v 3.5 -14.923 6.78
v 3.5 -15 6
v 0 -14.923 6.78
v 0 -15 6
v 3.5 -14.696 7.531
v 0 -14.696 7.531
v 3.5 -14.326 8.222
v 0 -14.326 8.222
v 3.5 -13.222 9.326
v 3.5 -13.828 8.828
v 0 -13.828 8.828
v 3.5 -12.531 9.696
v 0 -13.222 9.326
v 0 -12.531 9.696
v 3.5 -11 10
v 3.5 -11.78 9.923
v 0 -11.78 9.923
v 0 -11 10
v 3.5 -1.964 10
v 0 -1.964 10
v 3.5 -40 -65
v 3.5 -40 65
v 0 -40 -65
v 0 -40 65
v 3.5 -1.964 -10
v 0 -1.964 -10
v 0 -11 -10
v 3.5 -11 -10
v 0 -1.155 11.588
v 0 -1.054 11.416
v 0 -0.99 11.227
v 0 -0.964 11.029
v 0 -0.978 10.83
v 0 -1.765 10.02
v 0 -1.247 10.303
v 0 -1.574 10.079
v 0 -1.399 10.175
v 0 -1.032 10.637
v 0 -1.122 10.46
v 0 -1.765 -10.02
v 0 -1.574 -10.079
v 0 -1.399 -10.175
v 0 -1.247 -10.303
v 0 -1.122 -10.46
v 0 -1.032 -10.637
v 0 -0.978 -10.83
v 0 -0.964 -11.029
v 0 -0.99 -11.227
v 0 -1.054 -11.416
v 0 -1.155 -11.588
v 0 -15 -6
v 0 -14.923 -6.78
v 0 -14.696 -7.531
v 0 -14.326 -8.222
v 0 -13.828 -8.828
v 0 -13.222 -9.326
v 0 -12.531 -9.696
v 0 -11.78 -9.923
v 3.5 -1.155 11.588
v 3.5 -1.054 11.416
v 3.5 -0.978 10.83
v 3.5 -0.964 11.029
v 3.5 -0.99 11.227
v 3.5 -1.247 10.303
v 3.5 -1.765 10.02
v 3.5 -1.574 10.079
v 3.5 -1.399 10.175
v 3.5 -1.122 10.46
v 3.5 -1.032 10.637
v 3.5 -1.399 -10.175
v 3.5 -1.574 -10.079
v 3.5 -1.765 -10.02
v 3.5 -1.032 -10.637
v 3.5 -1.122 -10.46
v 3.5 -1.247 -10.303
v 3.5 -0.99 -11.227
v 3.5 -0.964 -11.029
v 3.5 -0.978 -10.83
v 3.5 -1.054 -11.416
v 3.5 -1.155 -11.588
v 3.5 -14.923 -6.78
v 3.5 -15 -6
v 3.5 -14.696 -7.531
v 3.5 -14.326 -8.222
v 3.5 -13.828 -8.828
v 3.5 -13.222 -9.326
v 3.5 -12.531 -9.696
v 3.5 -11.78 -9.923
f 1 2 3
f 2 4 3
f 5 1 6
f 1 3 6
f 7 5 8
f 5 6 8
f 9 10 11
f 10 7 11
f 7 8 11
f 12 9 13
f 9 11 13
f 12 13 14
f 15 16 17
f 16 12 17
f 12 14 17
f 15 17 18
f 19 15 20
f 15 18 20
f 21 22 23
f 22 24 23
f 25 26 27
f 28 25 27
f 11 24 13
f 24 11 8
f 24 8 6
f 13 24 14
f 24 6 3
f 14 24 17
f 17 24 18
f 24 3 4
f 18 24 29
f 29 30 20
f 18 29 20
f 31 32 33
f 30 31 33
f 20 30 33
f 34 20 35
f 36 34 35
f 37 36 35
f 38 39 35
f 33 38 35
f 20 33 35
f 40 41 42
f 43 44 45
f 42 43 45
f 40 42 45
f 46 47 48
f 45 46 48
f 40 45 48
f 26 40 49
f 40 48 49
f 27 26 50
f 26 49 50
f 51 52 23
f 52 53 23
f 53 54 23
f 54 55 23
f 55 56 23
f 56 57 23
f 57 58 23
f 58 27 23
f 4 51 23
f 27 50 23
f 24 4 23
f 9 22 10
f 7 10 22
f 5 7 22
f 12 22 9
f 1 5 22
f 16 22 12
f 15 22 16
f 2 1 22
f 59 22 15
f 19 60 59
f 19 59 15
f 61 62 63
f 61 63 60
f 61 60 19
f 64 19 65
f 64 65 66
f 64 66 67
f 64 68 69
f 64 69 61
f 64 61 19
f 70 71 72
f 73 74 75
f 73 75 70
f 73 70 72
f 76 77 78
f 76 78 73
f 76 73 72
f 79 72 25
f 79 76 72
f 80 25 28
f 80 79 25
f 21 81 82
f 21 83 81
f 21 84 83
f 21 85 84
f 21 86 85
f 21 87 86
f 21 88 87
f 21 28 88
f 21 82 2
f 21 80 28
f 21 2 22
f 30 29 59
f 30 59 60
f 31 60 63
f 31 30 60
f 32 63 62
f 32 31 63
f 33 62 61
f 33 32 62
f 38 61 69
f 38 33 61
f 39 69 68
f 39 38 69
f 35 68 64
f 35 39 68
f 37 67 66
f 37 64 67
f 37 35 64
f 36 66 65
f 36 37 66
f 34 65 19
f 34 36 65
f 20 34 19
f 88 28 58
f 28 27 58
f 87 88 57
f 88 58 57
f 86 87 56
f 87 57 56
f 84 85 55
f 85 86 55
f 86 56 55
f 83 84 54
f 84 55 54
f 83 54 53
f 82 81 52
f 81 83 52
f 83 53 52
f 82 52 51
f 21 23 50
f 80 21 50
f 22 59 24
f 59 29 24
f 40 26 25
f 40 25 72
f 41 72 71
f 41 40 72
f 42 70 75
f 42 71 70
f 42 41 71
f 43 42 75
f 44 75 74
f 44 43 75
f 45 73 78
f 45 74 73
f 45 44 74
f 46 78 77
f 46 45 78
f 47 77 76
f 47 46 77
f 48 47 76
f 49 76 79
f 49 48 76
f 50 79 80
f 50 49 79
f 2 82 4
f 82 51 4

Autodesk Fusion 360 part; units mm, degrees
sketch "Sketch1" plane through (0, 0, 0) normal (1, 0, 0) x (0, 0, -1)
  line L0 (10, -1.9638) -> (10, -11)
  line L1 (6, -15) -> (-6, -15)
  line L2 (-10, -11) -> (-10, -1.9638)
  line L3 (-65, -40) -> (65, -40)
  line L4 (-11.5882, -1.155) -> (-65, -40)
  line L5 (65, -40) -> (11.5882, -1.155)
  arc A0 (-10, -11) -> (-6, -15) centre (-6, -11) ccw
  arc A1 (6, -15) -> (10, -11) centre (6, -11) ccw
  arc A2 (-10, -1.9638) -> (-11.5882, -1.155) centre (-11, -1.9638) ccw
  arc A3 (11.5882, -1.155) -> (10, -1.9638) centre (11, -1.9638) ccw
  point P0 (10, 0)
  dimension "d136" = 20
  dimension "d137" = 10
  dimension "d138" = 65
  dimension "d139" = 4
  dimension "d140" = 4
  dimension "d141" = 1
  dimension "d142" = 1
extrude "Extrude1" add sketch "Sketch1" along normal blind 3.5
equation "d138 = ( 130 / 2 ) * 1 mm"
